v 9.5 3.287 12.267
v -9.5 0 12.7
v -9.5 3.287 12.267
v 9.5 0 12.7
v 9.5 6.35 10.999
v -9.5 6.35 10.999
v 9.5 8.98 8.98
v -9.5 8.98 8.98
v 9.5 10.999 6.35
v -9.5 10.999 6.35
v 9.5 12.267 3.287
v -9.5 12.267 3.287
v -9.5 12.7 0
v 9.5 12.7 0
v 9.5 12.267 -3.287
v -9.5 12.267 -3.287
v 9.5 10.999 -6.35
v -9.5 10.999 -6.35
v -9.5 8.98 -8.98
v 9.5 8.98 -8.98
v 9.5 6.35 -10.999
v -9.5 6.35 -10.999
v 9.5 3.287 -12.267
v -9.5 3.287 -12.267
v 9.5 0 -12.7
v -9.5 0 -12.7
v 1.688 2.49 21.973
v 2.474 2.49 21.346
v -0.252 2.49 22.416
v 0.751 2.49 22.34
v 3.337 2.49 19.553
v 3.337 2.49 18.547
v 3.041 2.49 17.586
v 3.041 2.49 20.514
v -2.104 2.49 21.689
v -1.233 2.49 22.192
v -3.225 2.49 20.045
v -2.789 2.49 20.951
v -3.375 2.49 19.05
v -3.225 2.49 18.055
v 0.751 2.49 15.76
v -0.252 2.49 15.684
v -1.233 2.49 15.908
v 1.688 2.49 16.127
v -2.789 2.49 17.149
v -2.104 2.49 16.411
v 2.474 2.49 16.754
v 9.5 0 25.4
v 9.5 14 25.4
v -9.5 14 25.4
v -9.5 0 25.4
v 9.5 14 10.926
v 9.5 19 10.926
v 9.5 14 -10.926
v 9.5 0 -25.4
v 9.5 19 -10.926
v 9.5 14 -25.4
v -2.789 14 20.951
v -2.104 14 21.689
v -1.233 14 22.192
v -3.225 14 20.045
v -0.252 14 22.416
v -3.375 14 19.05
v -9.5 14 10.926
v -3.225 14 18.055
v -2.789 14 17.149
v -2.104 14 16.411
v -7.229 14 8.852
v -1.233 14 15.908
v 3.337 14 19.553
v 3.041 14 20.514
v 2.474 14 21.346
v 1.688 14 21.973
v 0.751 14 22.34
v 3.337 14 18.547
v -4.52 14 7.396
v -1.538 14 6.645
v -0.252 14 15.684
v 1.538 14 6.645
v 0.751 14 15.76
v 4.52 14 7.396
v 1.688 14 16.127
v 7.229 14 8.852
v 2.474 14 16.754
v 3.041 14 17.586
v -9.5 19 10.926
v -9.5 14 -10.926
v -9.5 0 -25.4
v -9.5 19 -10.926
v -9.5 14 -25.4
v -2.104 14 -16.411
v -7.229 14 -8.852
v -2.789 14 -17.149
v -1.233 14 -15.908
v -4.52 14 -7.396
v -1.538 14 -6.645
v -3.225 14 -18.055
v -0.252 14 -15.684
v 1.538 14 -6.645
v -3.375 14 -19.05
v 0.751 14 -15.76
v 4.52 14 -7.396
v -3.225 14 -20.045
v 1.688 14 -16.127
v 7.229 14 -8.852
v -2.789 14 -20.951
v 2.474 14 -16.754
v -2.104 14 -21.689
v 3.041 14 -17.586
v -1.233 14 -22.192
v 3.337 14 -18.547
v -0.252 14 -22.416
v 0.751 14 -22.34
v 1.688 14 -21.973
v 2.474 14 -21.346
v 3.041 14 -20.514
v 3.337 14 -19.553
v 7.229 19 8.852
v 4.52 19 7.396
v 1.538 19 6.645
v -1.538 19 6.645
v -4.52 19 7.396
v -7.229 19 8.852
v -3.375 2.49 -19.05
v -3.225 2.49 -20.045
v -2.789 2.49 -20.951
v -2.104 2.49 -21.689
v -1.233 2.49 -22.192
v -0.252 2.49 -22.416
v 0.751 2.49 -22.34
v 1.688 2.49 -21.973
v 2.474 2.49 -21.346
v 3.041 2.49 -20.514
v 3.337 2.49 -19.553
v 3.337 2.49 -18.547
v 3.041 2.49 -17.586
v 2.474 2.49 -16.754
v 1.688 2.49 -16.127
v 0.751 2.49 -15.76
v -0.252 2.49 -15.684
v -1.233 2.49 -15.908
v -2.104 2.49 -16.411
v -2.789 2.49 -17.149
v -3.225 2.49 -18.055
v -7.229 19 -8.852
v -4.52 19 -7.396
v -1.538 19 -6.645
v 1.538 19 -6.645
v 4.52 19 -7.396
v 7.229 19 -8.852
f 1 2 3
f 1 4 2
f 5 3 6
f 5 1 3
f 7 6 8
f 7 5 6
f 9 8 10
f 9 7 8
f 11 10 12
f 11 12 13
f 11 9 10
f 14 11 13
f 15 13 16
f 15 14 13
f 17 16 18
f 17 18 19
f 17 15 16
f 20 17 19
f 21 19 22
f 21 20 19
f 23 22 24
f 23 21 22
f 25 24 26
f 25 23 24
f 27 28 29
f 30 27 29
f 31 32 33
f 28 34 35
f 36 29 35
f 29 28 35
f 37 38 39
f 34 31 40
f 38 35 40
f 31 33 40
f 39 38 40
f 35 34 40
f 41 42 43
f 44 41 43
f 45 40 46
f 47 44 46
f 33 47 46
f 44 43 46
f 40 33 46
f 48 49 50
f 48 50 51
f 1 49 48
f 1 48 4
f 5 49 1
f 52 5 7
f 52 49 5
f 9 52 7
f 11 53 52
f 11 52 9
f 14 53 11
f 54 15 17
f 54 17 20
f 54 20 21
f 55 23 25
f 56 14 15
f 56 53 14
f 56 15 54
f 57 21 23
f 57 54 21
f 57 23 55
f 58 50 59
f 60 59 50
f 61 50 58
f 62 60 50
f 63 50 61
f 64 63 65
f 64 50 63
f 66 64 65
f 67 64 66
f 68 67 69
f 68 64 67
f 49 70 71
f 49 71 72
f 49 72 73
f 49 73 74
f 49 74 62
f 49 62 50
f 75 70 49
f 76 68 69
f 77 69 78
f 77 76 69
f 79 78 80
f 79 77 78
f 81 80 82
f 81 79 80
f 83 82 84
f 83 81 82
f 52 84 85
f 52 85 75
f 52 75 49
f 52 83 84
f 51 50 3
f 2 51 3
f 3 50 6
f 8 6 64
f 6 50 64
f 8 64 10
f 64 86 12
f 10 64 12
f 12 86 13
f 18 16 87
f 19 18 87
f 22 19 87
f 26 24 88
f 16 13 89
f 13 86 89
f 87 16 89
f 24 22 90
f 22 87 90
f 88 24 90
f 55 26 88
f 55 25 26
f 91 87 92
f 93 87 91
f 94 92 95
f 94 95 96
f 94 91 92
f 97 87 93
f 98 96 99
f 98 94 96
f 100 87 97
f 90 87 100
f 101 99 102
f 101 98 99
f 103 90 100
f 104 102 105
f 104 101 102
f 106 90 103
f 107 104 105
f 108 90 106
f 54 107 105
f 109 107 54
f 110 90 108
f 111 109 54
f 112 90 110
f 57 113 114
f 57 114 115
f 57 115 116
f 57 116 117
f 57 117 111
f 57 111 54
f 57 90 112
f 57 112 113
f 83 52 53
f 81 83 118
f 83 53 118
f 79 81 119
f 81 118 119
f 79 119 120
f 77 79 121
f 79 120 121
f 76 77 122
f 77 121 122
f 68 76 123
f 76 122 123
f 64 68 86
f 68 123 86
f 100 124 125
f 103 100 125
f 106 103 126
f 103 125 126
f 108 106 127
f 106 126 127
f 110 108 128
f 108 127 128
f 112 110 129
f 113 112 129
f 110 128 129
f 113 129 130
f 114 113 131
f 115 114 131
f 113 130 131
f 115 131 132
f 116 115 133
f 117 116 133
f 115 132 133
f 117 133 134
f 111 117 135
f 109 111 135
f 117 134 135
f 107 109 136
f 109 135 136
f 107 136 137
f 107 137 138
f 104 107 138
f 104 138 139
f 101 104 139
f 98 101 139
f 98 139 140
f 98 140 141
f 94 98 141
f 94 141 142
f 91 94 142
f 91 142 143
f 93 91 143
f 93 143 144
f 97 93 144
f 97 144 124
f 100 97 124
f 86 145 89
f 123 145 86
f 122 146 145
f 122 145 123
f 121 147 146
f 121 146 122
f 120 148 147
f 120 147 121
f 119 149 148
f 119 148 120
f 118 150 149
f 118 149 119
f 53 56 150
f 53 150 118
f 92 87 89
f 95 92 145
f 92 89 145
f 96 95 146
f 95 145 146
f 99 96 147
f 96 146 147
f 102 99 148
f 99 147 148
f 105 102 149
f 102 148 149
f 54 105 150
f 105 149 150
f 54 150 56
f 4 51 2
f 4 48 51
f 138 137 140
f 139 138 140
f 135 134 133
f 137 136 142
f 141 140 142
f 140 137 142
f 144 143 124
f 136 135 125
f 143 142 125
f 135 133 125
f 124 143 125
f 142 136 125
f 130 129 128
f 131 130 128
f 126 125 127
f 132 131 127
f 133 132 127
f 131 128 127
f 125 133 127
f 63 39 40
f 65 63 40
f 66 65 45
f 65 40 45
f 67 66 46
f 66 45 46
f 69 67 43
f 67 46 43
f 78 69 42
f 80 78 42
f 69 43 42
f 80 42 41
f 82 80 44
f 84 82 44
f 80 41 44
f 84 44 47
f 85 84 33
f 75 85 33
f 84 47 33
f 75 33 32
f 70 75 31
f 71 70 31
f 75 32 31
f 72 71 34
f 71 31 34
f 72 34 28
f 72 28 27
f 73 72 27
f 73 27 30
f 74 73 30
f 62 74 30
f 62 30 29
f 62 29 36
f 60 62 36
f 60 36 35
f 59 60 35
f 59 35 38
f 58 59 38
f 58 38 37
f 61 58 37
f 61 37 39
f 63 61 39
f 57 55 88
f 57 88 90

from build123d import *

# Parameters (mm, degrees)
BOSS_EXTRUDE1_DEPTH                           = 9.5
CBORE_FOR_M12_HEX_HEAD_CAP_SCREW1_D           = 6.75
CBORE_FOR_M12_HEX_HEAD_CAP_SCREW1_DEPTH       = 16.51
CBORE_FOR_M12_HEX_HEAD_CAP_SCREW1_CBORE_D     = 25
CBORE_FOR_M12_HEX_HEAD_CAP_SCREW1_CBORE_DEPTH = 5


with BuildPart() as part:
    # Sketch1 → Boss-Extrude1 (new, symmetric)
    with BuildSketch(Plane(origin=(0, 0, 0), x_dir=(0, 0, -1), z_dir=(1, 0, 0))):
        with BuildLine():
            Line((12.7, 0), (25.4, 0))
            Line((25.4, 0), (25.4, 19))
            Line((25.4, 19), (-25.4, 19))
            Line((-25.4, 19), (-25.4, 0))
            Line((-25.4, 0), (-12.7, 0))
            ThreePointArc((-12.7, 0), (0, 12.7), (12.7, 0))
        make_face()
    extrude(amount=BOSS_EXTRUDE1_DEPTH, both=True)

    # CBORE for M12 Hex Head Cap Screw1
    with Locations(Plane(origin=(0, 19, 0), x_dir=(1, 0, 0), z_dir=(0, 1, 0))):
        with Locations((0, 19.05), (0, -19.05)):
            CounterBoreHole(CBORE_FOR_M12_HEX_HEAD_CAP_SCREW1_D / 2, CBORE_FOR_M12_HEX_HEAD_CAP_SCREW1_CBORE_D / 2, CBORE_FOR_M12_HEX_HEAD_CAP_SCREW1_CBORE_DEPTH, depth=CBORE_FOR_M12_HEX_HEAD_CAP_SCREW1_DEPTH)


solid = part.part
